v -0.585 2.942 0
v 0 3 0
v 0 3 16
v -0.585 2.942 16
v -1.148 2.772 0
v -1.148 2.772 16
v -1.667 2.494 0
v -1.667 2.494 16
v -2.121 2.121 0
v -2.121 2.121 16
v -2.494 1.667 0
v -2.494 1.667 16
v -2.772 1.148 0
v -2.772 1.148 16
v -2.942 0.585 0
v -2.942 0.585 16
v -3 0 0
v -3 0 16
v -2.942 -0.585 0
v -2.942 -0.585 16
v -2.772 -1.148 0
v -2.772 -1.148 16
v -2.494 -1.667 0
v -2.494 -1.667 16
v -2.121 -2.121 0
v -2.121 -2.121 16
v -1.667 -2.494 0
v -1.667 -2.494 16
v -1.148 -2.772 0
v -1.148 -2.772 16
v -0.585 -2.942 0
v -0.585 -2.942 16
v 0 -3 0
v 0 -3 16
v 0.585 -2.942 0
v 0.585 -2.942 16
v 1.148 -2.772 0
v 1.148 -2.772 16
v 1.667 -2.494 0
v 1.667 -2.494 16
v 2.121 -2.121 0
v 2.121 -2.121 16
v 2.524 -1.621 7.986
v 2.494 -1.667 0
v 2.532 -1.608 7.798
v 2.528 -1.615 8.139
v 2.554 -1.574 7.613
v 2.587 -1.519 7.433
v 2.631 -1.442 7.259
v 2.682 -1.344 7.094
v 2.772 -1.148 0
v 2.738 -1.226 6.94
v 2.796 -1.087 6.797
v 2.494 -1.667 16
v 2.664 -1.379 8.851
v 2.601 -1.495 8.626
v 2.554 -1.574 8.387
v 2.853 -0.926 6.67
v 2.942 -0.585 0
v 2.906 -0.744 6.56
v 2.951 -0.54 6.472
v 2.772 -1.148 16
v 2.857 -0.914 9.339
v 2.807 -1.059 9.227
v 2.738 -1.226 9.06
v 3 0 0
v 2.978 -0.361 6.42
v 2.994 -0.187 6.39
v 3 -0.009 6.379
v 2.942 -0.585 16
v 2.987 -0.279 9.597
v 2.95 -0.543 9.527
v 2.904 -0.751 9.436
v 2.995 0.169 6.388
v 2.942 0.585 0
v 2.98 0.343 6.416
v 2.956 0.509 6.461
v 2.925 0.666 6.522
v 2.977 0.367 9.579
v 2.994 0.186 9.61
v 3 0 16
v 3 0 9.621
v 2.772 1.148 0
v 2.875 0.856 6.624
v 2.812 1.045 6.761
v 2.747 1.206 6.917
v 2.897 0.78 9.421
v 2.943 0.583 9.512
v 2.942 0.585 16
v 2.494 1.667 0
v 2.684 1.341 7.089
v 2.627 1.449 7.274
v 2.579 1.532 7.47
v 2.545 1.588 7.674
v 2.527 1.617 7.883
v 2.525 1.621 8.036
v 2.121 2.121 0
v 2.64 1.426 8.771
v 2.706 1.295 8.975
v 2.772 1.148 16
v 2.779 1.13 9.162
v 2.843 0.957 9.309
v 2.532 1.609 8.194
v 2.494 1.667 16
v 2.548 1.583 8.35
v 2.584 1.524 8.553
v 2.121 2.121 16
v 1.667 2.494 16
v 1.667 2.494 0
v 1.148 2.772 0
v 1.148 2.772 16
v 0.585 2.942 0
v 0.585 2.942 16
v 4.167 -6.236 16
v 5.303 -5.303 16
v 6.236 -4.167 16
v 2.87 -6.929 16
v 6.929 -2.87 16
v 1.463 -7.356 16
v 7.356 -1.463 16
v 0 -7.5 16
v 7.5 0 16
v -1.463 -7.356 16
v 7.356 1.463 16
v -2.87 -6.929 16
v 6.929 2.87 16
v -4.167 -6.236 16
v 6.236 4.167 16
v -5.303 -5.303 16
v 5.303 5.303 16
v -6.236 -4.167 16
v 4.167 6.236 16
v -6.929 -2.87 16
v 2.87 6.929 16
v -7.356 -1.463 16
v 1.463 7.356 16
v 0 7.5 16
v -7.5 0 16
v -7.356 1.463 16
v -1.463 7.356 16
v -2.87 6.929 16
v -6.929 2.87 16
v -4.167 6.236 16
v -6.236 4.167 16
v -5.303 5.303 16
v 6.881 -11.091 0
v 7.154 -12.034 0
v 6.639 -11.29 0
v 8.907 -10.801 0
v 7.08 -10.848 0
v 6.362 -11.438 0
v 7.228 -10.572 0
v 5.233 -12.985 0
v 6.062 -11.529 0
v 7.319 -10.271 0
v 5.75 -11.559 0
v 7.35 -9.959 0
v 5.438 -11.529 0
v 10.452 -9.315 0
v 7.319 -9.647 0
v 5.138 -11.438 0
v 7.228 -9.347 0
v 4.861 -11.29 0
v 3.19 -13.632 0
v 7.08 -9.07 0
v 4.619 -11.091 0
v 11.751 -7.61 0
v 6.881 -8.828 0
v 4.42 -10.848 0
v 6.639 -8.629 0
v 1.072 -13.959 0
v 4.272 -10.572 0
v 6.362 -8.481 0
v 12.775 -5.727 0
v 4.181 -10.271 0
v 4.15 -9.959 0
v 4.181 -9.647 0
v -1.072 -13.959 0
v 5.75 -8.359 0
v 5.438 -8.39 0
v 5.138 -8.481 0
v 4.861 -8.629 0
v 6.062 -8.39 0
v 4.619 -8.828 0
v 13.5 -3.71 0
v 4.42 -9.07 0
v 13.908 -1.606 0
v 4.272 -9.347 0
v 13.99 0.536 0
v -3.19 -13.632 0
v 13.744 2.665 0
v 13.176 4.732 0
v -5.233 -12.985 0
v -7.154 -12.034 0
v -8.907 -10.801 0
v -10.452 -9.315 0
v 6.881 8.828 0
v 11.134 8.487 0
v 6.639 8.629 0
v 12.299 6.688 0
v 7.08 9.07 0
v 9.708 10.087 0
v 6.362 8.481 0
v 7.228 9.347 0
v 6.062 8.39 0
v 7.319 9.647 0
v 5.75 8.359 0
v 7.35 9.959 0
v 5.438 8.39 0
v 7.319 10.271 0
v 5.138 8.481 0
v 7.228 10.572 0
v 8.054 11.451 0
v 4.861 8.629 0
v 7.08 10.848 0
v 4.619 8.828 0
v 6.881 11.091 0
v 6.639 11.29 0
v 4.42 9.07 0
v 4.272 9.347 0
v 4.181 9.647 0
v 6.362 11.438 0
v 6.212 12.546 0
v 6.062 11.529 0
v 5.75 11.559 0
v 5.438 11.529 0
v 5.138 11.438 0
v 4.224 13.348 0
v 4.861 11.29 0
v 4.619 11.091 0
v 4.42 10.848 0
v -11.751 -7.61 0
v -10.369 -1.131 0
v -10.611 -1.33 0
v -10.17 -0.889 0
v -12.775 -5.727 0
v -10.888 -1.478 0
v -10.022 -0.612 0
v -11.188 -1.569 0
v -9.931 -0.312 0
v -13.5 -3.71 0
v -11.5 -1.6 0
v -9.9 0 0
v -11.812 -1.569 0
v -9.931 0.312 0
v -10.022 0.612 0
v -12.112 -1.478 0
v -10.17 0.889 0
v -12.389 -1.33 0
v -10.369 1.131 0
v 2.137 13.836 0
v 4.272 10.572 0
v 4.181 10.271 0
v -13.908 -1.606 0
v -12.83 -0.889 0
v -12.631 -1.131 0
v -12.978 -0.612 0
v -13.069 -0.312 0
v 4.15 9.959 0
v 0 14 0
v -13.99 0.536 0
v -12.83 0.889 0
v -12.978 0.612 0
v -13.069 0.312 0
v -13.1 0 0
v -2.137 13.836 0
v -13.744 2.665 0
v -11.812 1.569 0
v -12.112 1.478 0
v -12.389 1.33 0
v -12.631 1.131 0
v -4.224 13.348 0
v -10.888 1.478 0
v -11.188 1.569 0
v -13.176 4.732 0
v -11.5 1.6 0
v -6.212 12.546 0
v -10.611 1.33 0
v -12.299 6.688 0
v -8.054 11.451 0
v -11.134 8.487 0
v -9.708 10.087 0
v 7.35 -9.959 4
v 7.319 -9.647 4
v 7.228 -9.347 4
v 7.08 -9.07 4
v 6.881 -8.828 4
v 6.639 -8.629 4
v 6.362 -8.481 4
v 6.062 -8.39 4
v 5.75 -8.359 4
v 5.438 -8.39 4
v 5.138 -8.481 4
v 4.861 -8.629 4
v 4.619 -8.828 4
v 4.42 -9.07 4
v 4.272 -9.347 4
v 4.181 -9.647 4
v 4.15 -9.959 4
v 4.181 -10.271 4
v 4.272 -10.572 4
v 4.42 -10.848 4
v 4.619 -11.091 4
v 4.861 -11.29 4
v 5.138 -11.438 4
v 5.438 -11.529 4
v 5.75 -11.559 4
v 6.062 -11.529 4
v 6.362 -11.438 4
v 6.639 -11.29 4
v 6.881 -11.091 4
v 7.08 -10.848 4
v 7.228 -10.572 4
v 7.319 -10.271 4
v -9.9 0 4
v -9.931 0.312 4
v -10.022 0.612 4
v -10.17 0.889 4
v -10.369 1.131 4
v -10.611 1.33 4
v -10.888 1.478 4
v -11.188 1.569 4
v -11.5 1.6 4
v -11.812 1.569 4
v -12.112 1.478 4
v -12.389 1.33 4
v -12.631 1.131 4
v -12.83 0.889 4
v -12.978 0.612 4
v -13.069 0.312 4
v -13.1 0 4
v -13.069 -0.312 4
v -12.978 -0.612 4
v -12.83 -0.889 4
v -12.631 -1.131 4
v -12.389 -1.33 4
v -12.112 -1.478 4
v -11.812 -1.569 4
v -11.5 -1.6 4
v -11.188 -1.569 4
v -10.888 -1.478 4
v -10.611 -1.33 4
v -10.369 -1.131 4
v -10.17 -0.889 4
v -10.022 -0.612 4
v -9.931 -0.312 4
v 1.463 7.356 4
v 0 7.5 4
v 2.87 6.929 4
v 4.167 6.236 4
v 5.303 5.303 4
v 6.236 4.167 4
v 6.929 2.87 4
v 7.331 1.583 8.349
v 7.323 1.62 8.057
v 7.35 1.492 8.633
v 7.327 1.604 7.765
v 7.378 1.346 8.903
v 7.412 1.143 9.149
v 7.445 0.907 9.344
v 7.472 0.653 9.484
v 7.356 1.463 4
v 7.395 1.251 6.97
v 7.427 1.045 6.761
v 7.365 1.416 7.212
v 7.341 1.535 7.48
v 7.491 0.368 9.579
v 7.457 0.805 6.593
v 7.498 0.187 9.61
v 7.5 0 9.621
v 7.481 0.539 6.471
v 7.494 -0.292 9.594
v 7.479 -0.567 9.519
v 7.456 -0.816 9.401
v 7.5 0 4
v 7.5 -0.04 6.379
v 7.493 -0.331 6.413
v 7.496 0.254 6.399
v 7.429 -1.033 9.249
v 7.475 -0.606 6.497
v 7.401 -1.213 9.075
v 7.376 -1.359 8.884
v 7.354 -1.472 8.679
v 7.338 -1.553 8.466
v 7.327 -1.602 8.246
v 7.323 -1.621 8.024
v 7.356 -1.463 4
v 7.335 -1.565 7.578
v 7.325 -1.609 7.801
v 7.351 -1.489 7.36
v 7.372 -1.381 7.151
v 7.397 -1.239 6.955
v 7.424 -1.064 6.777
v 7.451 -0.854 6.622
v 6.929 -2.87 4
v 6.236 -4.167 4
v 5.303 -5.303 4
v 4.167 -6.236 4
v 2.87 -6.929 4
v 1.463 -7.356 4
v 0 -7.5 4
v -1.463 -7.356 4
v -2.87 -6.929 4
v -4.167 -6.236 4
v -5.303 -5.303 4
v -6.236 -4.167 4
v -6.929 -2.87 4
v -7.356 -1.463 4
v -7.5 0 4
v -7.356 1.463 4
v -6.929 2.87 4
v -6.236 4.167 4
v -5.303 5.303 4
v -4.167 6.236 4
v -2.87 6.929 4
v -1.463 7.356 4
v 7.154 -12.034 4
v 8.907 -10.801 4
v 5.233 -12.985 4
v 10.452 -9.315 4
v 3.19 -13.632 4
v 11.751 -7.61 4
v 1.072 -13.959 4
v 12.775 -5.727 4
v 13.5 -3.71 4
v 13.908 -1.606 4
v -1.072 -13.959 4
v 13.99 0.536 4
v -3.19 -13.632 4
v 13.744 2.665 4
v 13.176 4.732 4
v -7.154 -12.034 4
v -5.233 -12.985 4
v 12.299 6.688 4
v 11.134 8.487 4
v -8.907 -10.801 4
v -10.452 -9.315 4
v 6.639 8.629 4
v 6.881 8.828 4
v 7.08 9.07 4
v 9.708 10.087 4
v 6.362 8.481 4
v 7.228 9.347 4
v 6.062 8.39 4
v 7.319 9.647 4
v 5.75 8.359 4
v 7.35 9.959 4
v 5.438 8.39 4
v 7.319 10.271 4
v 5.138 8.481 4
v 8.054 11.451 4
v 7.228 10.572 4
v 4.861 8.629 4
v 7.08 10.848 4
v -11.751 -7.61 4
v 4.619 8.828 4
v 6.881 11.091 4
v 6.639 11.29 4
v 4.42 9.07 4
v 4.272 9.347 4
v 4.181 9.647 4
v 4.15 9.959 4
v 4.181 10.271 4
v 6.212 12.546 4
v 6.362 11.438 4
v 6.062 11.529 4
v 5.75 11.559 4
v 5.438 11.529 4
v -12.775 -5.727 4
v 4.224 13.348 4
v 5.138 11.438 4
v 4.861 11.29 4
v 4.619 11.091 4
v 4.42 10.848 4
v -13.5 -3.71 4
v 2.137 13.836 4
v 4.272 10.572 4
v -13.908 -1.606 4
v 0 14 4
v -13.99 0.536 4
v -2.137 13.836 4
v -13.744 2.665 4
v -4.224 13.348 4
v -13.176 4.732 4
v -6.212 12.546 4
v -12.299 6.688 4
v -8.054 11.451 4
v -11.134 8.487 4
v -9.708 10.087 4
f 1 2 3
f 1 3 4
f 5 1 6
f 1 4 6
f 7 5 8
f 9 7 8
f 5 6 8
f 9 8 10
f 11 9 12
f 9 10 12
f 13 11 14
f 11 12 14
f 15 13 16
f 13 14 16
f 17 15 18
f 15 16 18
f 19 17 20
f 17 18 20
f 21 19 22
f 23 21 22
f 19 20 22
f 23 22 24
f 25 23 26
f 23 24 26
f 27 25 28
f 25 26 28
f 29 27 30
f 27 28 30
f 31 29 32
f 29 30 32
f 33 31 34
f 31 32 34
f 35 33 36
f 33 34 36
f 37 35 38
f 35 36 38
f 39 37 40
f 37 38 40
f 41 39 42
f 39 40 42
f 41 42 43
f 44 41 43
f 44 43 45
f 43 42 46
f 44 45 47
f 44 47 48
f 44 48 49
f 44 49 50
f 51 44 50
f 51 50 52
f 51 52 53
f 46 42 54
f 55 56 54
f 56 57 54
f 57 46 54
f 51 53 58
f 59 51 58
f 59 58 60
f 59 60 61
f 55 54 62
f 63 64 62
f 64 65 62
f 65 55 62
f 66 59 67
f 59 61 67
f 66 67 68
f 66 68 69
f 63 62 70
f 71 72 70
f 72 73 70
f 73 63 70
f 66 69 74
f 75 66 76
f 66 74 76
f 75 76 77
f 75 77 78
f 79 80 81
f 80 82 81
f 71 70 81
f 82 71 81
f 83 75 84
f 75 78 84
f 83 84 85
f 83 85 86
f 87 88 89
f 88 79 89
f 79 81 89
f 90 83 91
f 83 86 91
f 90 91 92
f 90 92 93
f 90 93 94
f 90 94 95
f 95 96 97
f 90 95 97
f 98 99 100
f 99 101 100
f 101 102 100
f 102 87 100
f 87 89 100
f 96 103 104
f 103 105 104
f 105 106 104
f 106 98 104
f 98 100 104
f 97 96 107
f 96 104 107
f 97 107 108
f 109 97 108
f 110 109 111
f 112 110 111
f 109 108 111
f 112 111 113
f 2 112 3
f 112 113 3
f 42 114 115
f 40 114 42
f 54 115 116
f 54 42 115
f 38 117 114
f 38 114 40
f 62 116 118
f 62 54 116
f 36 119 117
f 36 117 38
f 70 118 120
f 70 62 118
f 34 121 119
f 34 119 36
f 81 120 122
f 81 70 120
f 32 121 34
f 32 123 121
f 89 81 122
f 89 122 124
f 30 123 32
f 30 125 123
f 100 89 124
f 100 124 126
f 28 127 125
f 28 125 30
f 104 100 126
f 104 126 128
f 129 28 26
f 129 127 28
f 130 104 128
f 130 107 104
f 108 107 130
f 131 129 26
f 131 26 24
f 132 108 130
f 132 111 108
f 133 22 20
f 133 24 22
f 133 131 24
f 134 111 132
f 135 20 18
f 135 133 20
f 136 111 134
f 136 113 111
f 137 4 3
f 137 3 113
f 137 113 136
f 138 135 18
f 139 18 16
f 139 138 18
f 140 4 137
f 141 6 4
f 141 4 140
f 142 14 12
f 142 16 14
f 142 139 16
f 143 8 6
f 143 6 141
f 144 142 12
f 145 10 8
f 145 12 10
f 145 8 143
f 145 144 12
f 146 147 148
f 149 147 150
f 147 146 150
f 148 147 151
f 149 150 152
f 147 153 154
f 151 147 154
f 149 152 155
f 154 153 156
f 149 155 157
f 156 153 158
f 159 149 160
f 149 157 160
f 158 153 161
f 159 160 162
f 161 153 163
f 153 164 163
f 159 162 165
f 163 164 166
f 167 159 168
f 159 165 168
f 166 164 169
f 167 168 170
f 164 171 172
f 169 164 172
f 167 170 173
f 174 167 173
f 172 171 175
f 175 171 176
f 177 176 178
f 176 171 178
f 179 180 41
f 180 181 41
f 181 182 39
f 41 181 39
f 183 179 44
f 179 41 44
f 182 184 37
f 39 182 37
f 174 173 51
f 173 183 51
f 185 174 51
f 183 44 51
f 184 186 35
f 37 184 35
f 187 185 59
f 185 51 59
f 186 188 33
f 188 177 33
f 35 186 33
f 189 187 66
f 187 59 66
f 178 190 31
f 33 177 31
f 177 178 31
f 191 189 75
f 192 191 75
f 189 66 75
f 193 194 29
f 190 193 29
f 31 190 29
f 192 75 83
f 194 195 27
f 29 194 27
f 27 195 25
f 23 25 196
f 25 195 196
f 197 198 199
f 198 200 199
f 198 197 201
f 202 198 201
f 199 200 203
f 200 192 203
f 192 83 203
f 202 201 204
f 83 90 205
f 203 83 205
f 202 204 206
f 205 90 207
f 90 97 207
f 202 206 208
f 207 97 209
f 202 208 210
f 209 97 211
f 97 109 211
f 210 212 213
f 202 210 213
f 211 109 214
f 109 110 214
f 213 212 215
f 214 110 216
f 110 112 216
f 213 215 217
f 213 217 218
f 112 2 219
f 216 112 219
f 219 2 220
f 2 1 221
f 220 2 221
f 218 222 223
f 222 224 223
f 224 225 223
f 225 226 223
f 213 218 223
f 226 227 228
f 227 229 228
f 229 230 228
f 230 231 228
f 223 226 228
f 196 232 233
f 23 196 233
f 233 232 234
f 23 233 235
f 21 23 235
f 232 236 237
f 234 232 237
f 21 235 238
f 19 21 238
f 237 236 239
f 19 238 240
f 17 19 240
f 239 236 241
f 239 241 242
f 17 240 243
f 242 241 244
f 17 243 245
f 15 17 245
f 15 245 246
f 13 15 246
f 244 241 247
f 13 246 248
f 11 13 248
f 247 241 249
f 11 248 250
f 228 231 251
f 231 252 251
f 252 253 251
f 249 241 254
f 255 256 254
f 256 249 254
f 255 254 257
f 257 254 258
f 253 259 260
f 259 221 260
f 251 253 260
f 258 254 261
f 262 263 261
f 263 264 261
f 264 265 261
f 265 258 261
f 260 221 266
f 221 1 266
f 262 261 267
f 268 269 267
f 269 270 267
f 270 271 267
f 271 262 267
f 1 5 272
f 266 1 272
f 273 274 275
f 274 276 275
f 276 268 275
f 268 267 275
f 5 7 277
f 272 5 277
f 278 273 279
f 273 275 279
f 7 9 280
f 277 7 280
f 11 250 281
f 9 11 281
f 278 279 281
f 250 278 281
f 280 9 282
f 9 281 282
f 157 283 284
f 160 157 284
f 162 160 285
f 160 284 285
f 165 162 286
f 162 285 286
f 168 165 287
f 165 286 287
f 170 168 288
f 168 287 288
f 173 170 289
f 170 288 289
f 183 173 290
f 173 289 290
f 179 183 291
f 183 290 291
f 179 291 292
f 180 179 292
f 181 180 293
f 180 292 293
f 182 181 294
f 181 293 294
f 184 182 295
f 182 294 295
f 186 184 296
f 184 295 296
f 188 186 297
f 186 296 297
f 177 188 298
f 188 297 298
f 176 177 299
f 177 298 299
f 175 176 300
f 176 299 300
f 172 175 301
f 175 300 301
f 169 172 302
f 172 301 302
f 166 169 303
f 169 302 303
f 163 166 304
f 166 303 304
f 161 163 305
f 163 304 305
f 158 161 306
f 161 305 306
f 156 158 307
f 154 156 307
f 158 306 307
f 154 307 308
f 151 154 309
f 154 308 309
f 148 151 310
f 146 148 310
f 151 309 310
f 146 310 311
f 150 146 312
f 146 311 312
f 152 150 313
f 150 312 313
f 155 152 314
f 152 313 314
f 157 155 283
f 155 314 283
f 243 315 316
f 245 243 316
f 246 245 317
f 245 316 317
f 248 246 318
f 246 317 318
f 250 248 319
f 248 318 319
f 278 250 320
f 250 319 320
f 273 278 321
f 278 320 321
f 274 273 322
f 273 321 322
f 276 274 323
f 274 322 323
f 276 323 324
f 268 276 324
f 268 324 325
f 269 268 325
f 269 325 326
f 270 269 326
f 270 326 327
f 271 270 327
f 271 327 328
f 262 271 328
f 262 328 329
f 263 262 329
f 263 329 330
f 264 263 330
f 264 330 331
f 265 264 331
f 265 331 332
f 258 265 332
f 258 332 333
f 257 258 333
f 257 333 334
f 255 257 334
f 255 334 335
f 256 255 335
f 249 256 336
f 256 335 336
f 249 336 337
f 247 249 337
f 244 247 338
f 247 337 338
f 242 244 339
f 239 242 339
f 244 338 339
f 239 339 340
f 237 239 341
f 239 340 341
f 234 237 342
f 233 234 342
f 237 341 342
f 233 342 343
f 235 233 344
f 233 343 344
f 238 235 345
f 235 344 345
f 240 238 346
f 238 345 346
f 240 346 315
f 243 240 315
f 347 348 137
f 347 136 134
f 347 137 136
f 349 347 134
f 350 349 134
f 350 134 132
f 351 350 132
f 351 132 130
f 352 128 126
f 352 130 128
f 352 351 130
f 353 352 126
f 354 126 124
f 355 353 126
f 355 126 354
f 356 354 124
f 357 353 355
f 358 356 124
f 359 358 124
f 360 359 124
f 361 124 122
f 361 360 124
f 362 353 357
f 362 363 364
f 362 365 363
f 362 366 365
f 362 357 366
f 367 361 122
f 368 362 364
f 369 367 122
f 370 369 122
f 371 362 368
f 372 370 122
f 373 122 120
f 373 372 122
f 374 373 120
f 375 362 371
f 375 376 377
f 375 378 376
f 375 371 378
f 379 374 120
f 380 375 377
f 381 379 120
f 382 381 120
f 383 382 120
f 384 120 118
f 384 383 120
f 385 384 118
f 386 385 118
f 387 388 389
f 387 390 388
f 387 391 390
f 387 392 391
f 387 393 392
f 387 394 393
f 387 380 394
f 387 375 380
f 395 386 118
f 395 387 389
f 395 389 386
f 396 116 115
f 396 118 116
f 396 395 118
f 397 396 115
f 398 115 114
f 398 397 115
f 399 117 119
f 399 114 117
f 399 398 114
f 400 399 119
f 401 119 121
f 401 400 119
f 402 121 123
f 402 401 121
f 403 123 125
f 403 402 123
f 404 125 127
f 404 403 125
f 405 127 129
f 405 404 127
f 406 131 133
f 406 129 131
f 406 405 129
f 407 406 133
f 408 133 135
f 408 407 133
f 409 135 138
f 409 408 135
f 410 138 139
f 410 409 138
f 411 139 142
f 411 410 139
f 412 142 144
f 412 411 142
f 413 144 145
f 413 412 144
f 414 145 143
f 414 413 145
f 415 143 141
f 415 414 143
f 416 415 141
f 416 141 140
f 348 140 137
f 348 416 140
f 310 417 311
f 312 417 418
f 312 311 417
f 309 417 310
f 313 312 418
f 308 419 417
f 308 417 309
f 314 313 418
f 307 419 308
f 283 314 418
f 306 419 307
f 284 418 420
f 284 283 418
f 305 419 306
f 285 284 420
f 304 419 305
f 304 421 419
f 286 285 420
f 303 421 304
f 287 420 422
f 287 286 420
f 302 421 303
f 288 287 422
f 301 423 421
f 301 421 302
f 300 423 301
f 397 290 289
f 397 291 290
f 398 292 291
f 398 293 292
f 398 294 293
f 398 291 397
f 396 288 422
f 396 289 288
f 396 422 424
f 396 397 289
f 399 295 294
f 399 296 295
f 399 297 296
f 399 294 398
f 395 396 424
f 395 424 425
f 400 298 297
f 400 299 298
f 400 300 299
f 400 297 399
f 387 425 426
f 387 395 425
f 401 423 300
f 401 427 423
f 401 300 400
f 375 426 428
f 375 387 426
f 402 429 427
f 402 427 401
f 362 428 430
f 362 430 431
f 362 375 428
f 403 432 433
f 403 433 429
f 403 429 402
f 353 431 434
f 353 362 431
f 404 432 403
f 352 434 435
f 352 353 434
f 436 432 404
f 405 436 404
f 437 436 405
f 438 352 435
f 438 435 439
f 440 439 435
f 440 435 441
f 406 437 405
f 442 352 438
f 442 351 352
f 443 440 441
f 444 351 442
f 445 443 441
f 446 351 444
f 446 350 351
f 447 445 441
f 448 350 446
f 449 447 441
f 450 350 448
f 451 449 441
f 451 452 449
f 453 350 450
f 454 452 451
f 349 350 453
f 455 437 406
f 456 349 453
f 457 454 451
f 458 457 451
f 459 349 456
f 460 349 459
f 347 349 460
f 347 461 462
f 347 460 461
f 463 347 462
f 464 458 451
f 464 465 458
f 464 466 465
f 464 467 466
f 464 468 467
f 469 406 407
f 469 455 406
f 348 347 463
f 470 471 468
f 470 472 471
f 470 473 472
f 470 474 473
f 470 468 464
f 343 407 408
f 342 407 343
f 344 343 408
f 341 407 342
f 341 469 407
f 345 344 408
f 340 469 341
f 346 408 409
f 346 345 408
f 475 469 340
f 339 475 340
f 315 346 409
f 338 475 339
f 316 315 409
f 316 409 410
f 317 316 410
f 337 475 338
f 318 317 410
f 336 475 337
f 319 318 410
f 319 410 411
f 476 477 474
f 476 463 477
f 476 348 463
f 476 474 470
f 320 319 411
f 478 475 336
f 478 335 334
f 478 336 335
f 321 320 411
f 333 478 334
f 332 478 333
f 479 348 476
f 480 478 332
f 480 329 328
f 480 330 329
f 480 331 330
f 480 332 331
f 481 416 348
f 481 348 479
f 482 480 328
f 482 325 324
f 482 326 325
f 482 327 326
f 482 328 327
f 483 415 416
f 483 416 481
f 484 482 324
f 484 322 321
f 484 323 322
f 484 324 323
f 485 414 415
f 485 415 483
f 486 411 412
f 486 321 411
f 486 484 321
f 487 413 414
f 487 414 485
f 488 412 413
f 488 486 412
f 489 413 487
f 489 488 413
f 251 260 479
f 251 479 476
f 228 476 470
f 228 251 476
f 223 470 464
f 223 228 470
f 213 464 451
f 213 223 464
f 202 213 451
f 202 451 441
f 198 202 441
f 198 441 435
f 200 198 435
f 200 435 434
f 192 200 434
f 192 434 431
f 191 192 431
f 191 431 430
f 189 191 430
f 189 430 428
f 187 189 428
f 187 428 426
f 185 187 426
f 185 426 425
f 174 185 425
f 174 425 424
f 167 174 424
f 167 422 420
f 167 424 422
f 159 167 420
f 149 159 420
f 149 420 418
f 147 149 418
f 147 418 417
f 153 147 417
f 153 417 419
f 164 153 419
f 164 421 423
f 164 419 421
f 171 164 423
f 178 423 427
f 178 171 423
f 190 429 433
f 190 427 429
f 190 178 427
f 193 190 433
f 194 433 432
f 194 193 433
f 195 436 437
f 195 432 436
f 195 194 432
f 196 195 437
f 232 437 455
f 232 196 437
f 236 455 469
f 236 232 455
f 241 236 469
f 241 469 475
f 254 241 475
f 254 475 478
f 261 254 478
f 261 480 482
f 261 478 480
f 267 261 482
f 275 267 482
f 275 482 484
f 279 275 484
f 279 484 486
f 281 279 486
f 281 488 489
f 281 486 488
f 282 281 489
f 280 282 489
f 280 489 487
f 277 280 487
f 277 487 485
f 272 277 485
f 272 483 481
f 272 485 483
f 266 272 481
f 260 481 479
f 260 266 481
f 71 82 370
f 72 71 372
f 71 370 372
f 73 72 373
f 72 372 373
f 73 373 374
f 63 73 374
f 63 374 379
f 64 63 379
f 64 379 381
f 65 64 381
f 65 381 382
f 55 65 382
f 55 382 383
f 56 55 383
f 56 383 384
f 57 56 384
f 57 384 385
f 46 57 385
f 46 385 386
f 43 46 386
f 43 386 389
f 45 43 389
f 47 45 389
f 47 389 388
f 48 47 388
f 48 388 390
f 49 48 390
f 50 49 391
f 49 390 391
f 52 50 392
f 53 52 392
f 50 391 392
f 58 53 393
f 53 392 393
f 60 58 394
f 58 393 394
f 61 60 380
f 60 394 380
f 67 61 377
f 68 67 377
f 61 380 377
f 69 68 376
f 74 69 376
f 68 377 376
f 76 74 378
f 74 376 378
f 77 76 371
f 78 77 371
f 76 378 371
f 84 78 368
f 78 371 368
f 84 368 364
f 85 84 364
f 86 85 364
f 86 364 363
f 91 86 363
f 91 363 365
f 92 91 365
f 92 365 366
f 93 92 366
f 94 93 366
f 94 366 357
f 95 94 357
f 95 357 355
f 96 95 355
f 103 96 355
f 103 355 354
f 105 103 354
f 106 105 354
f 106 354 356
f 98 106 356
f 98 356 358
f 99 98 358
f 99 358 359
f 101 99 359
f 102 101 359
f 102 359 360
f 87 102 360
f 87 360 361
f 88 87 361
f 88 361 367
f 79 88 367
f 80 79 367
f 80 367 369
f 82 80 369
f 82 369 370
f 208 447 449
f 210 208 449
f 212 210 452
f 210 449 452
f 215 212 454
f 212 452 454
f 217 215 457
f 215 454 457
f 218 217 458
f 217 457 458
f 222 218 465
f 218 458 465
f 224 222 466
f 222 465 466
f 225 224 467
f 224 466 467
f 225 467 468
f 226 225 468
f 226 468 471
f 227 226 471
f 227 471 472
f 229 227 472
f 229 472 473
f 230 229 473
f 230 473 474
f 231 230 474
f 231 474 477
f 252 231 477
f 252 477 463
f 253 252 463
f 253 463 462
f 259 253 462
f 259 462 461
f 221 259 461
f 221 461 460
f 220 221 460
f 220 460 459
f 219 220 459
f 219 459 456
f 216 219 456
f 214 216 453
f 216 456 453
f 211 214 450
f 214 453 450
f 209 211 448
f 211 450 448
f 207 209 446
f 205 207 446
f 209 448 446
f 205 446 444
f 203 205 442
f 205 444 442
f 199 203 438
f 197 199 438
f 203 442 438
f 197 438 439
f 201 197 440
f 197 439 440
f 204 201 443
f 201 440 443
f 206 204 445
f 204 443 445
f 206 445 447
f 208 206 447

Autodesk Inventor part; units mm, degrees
ref_plane "YZ Plane" through (0, 0, 0) normal (1, 0, 0) x (0, 1, 0)
ref_plane "XZ Plane" through (0, 0, 0) normal (0, 1, 0) x (-1, 0, 0)
ref_plane "XY Plane" through (0, 0, 0) normal (0, 0, 1) x (1, 0, 0)
sketch "スケッチ1" plane through (0, 0, 0) normal (1, 0, 0) x (0, 1, 0)
  line L0 (0, -3.2) -> (0, 19.2) construction
  line L1 (-2.8, 0) -> (16.8, 0) construction
  line L2 (3, 16) -> (7.5, 16)
  line L3 (7.5, 16) -> (7.5, 4)
  line L4 (7.5, 4) -> (14, 4)
  line L5 (14, 4) -> (14, 0)
  line L6 (14, 0) -> (3, 0)
  line L7 (3, 0) -> (3, 16)
  point P0 (0, 0)
  dimension "d0" = 6
  dimension "d1" = 15
  dimension "d2" = 28
  dimension "d3" = 4
  dimension "d4" = 16
revolve "回転1" add sketch "スケッチ1" angle 360 about axis through (0, 0, -10) along (0, 0, 1)
sketch "スケッチ2" plane through (0, 0, 0) normal (1, 0, 0) x (0, 1, 0)
  line L0 (14, 0) -> (-14, 0) construction
  line L1 (0, -3.2) -> (0, 19.2) construction
  point P0 (0, 0)
  point P1 (0, 8)
  dimension "d8" = 8
hole "穴1" at (0, 0, 8) direction (1, 0, 0) diameter 3.242 end through all thread size "M4x0.7" class "6H" standard "ISO Metric profile"
sketch "スケッチ3" plane through (0, 0, 4) normal (0, 0, 1) x (1, 0, 0)
  circle A0 centre (-11.5, 0) radius 1.6
  line L0 (-19.6, 0) -> (19.6, 0) construction
  circle A1 centre (0, 0) radius 11.5 construction
  circle A2 centre (5.75, -9.9593) radius 1.6
  circle A3 centre (5.75, 9.9593) radius 1.6
  dimension "d16" = 23
  dimension "d17" = 3.2
  dimension "d20" = 360
extrude "押し出し1" cut sketch "スケッチ3" against normal through all
properties part number "mecanum_hub" material "アルミニウム 6061"
